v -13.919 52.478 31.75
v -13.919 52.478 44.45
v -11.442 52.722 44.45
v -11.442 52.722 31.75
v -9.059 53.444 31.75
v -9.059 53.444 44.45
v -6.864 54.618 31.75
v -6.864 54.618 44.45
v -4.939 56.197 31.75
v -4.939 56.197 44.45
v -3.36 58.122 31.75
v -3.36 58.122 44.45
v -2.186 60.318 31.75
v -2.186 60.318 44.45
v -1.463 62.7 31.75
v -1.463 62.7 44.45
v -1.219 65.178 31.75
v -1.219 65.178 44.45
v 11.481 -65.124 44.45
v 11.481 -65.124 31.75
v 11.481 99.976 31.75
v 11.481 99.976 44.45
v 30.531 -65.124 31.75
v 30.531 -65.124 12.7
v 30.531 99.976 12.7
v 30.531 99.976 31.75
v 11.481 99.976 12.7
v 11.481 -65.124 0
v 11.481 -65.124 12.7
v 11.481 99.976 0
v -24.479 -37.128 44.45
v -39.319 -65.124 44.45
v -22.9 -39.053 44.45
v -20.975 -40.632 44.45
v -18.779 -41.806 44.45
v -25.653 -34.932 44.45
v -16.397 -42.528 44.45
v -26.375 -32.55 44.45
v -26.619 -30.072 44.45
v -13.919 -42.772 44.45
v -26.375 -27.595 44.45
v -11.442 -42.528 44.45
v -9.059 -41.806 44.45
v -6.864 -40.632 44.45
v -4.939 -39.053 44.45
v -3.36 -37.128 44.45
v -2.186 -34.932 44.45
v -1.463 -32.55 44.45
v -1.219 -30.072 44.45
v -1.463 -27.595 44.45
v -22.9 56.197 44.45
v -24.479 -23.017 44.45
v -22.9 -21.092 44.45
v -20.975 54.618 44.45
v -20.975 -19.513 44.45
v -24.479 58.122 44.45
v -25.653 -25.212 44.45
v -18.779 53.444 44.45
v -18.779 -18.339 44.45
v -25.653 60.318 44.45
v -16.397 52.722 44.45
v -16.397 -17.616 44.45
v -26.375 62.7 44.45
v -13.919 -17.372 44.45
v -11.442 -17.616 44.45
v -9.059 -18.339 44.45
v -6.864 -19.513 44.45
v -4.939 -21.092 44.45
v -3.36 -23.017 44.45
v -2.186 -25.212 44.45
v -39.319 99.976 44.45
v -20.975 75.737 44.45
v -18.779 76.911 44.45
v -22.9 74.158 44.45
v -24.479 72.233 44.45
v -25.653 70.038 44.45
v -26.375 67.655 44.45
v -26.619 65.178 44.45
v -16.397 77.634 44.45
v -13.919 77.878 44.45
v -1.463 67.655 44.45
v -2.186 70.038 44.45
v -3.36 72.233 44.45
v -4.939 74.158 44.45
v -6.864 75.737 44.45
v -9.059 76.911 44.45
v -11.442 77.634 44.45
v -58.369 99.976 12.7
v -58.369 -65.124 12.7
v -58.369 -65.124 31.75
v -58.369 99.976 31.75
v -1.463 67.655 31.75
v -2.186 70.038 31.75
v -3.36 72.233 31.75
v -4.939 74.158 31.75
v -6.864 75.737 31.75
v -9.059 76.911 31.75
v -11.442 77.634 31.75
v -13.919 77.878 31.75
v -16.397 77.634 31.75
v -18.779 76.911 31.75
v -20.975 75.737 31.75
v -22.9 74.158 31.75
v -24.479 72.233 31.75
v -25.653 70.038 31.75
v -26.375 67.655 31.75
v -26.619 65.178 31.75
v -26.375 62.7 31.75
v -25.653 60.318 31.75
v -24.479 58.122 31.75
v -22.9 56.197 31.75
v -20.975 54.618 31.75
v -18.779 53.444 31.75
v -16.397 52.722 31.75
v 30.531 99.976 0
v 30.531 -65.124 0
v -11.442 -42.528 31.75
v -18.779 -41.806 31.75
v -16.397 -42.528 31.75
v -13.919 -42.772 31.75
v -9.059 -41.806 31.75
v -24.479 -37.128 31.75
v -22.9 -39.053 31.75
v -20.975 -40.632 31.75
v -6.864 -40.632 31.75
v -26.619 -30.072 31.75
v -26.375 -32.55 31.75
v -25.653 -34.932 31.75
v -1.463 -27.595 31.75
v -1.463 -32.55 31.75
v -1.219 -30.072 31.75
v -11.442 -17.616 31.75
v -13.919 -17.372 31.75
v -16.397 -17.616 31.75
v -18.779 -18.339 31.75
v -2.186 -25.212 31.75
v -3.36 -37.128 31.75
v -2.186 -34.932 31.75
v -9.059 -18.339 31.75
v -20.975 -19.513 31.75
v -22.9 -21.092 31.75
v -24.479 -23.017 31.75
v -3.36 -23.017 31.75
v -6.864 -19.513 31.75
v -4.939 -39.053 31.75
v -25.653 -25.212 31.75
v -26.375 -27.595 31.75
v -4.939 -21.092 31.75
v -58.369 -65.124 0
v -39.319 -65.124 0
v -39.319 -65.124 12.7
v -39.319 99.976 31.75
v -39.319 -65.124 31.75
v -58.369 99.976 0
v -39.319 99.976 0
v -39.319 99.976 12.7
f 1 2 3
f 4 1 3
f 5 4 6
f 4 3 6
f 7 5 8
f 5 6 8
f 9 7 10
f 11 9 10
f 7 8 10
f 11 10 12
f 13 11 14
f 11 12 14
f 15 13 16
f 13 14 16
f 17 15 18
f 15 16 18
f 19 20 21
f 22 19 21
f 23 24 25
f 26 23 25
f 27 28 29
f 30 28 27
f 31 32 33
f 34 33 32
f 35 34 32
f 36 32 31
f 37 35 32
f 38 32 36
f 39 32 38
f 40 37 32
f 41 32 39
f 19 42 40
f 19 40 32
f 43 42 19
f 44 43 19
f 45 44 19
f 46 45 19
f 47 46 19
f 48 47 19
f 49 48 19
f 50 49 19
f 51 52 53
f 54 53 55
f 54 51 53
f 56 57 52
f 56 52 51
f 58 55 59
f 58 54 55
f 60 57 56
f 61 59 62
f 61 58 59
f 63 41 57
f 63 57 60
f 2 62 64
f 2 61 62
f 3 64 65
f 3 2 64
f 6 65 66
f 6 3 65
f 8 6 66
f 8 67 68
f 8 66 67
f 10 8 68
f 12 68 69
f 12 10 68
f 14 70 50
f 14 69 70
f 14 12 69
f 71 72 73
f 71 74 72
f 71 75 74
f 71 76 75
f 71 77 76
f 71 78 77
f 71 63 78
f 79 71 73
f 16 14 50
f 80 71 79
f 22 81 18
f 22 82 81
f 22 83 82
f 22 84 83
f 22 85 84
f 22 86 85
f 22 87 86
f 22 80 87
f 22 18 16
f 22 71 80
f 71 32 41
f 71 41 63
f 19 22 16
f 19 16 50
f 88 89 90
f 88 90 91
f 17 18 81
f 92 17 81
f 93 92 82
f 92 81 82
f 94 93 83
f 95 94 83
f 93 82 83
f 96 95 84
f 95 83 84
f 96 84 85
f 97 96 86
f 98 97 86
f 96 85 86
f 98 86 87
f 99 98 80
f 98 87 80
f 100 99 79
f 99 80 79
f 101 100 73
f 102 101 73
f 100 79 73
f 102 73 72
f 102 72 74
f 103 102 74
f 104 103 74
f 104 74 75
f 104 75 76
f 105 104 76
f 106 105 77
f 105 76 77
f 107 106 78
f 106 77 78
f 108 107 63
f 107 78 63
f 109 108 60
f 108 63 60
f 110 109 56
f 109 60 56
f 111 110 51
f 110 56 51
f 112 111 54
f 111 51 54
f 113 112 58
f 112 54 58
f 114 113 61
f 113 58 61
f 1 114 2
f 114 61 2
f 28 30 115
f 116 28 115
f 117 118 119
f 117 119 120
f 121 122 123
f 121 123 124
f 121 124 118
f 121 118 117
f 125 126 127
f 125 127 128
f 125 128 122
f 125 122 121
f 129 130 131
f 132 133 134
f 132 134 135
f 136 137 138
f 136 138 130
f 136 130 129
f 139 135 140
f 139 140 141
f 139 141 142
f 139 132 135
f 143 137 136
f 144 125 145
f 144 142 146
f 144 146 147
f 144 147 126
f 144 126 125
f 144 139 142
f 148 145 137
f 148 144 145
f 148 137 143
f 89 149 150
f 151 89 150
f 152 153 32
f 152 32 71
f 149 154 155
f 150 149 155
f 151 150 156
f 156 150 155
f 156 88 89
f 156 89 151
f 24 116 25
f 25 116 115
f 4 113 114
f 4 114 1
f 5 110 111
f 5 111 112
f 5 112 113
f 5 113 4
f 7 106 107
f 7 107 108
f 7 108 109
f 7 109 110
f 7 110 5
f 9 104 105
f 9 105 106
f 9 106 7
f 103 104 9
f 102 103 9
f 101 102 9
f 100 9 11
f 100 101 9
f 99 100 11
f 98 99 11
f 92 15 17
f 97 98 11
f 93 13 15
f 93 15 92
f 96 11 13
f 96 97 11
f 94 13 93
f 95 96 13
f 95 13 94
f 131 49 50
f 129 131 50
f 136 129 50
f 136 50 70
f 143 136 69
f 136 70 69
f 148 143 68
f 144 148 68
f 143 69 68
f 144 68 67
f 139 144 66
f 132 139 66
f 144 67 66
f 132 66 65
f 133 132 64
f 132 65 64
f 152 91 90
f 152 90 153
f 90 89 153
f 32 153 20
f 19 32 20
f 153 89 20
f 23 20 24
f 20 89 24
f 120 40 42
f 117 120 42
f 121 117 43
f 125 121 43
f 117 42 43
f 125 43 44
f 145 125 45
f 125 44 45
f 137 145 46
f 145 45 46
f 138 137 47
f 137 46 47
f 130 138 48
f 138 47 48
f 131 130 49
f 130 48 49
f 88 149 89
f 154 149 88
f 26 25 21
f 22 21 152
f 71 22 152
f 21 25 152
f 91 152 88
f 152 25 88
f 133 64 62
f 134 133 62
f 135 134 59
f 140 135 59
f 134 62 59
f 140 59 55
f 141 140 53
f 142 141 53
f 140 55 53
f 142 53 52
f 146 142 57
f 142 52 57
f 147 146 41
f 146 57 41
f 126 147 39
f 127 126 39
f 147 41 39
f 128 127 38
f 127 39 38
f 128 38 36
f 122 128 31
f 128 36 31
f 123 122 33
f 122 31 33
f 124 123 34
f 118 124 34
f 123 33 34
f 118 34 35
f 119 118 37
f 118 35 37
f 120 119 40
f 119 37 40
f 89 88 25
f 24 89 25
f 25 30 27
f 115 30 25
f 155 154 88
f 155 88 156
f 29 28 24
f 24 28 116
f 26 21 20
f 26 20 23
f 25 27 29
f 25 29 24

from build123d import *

# Parameters (mm, degrees)
F0_W     = 19.05
F0_H     = 165.1
F1_DEPTH = 12.7
F2_W     = 69.85
F2_H     = 165.1
F2_W_2   = 19.05
F3_DEPTH = 19.05
F4_W     = 50.8
F4_H     = 165.1
F5_DEPTH = 12.7
F7_DEPTH = 12.7


with BuildPart() as f1:
    # F0 (on Top) → F1 (new body)
    with BuildSketch(Plane.XY):
        with Locations((-48.844324, 17.425585)):
            Rectangle(F0_W, F0_H)
        with Locations((21.005676, 17.425585)):
            Rectangle(F0_W, F0_H)
    extrude(amount=F1_DEPTH)


with BuildPart() as f3:
    # F2 (on face) → F3 (new body)
    with BuildSketch(Plane.XY.offset(12.7)):
        with Locations((-23.444324, 17.425585)):
            Rectangle(F2_W, F2_H)
        with Locations((21.005676, 17.425585)):
            Rectangle(F2_W_2, F2_H)
    extrude(amount=F3_DEPTH)

    # F4 (on face) → F5 (join)
    with BuildSketch(Plane.XY.offset(31.75)):
        with Locations((-13.919324, 17.425585)):
            Rectangle(F4_W, F4_H)
    extrude(amount=F5_DEPTH)

    # F6 (on face) → F7 (cut)
    with BuildSketch(Plane.XY.offset(44.45)):
        with BuildLine():
            Line((-13.919324, -30.072415), (-13.919324, -42.772415))
            ThreePointArc((-13.919324, -42.772415), (-4.939068, -39.052671), (-1.219324, -30.072415))
            ThreePointArc((-1.219324, -30.072415), (-4.939068, -21.092159), (-13.919324, -17.372415))
            Line((-13.919324, -17.372415), (-13.919324, -30.072415))
        make_face()
        with BuildLine():
            ThreePointArc((-13.919324, -17.372415), (-26.619324, -30.072415), (-13.919324, -42.772415))
            Line((-13.919324, -42.772415), (-13.919324, -30.072415))
            Line((-13.919324, -30.072415), (-13.919324, -17.372415))
        make_face()
        with BuildLine():
            ThreePointArc((-1.219324, 65.177585), (-22.89958, 74.157841), (-13.919324, 52.477585))
            ThreePointArc((-13.919324, 52.477585), (-4.939068, 56.197329), (-1.219324, 65.177585))
        make_face()
    extrude(amount=-F7_DEPTH, mode=Mode.SUBTRACT)


solid = Compound([f1.part, f3.part])
